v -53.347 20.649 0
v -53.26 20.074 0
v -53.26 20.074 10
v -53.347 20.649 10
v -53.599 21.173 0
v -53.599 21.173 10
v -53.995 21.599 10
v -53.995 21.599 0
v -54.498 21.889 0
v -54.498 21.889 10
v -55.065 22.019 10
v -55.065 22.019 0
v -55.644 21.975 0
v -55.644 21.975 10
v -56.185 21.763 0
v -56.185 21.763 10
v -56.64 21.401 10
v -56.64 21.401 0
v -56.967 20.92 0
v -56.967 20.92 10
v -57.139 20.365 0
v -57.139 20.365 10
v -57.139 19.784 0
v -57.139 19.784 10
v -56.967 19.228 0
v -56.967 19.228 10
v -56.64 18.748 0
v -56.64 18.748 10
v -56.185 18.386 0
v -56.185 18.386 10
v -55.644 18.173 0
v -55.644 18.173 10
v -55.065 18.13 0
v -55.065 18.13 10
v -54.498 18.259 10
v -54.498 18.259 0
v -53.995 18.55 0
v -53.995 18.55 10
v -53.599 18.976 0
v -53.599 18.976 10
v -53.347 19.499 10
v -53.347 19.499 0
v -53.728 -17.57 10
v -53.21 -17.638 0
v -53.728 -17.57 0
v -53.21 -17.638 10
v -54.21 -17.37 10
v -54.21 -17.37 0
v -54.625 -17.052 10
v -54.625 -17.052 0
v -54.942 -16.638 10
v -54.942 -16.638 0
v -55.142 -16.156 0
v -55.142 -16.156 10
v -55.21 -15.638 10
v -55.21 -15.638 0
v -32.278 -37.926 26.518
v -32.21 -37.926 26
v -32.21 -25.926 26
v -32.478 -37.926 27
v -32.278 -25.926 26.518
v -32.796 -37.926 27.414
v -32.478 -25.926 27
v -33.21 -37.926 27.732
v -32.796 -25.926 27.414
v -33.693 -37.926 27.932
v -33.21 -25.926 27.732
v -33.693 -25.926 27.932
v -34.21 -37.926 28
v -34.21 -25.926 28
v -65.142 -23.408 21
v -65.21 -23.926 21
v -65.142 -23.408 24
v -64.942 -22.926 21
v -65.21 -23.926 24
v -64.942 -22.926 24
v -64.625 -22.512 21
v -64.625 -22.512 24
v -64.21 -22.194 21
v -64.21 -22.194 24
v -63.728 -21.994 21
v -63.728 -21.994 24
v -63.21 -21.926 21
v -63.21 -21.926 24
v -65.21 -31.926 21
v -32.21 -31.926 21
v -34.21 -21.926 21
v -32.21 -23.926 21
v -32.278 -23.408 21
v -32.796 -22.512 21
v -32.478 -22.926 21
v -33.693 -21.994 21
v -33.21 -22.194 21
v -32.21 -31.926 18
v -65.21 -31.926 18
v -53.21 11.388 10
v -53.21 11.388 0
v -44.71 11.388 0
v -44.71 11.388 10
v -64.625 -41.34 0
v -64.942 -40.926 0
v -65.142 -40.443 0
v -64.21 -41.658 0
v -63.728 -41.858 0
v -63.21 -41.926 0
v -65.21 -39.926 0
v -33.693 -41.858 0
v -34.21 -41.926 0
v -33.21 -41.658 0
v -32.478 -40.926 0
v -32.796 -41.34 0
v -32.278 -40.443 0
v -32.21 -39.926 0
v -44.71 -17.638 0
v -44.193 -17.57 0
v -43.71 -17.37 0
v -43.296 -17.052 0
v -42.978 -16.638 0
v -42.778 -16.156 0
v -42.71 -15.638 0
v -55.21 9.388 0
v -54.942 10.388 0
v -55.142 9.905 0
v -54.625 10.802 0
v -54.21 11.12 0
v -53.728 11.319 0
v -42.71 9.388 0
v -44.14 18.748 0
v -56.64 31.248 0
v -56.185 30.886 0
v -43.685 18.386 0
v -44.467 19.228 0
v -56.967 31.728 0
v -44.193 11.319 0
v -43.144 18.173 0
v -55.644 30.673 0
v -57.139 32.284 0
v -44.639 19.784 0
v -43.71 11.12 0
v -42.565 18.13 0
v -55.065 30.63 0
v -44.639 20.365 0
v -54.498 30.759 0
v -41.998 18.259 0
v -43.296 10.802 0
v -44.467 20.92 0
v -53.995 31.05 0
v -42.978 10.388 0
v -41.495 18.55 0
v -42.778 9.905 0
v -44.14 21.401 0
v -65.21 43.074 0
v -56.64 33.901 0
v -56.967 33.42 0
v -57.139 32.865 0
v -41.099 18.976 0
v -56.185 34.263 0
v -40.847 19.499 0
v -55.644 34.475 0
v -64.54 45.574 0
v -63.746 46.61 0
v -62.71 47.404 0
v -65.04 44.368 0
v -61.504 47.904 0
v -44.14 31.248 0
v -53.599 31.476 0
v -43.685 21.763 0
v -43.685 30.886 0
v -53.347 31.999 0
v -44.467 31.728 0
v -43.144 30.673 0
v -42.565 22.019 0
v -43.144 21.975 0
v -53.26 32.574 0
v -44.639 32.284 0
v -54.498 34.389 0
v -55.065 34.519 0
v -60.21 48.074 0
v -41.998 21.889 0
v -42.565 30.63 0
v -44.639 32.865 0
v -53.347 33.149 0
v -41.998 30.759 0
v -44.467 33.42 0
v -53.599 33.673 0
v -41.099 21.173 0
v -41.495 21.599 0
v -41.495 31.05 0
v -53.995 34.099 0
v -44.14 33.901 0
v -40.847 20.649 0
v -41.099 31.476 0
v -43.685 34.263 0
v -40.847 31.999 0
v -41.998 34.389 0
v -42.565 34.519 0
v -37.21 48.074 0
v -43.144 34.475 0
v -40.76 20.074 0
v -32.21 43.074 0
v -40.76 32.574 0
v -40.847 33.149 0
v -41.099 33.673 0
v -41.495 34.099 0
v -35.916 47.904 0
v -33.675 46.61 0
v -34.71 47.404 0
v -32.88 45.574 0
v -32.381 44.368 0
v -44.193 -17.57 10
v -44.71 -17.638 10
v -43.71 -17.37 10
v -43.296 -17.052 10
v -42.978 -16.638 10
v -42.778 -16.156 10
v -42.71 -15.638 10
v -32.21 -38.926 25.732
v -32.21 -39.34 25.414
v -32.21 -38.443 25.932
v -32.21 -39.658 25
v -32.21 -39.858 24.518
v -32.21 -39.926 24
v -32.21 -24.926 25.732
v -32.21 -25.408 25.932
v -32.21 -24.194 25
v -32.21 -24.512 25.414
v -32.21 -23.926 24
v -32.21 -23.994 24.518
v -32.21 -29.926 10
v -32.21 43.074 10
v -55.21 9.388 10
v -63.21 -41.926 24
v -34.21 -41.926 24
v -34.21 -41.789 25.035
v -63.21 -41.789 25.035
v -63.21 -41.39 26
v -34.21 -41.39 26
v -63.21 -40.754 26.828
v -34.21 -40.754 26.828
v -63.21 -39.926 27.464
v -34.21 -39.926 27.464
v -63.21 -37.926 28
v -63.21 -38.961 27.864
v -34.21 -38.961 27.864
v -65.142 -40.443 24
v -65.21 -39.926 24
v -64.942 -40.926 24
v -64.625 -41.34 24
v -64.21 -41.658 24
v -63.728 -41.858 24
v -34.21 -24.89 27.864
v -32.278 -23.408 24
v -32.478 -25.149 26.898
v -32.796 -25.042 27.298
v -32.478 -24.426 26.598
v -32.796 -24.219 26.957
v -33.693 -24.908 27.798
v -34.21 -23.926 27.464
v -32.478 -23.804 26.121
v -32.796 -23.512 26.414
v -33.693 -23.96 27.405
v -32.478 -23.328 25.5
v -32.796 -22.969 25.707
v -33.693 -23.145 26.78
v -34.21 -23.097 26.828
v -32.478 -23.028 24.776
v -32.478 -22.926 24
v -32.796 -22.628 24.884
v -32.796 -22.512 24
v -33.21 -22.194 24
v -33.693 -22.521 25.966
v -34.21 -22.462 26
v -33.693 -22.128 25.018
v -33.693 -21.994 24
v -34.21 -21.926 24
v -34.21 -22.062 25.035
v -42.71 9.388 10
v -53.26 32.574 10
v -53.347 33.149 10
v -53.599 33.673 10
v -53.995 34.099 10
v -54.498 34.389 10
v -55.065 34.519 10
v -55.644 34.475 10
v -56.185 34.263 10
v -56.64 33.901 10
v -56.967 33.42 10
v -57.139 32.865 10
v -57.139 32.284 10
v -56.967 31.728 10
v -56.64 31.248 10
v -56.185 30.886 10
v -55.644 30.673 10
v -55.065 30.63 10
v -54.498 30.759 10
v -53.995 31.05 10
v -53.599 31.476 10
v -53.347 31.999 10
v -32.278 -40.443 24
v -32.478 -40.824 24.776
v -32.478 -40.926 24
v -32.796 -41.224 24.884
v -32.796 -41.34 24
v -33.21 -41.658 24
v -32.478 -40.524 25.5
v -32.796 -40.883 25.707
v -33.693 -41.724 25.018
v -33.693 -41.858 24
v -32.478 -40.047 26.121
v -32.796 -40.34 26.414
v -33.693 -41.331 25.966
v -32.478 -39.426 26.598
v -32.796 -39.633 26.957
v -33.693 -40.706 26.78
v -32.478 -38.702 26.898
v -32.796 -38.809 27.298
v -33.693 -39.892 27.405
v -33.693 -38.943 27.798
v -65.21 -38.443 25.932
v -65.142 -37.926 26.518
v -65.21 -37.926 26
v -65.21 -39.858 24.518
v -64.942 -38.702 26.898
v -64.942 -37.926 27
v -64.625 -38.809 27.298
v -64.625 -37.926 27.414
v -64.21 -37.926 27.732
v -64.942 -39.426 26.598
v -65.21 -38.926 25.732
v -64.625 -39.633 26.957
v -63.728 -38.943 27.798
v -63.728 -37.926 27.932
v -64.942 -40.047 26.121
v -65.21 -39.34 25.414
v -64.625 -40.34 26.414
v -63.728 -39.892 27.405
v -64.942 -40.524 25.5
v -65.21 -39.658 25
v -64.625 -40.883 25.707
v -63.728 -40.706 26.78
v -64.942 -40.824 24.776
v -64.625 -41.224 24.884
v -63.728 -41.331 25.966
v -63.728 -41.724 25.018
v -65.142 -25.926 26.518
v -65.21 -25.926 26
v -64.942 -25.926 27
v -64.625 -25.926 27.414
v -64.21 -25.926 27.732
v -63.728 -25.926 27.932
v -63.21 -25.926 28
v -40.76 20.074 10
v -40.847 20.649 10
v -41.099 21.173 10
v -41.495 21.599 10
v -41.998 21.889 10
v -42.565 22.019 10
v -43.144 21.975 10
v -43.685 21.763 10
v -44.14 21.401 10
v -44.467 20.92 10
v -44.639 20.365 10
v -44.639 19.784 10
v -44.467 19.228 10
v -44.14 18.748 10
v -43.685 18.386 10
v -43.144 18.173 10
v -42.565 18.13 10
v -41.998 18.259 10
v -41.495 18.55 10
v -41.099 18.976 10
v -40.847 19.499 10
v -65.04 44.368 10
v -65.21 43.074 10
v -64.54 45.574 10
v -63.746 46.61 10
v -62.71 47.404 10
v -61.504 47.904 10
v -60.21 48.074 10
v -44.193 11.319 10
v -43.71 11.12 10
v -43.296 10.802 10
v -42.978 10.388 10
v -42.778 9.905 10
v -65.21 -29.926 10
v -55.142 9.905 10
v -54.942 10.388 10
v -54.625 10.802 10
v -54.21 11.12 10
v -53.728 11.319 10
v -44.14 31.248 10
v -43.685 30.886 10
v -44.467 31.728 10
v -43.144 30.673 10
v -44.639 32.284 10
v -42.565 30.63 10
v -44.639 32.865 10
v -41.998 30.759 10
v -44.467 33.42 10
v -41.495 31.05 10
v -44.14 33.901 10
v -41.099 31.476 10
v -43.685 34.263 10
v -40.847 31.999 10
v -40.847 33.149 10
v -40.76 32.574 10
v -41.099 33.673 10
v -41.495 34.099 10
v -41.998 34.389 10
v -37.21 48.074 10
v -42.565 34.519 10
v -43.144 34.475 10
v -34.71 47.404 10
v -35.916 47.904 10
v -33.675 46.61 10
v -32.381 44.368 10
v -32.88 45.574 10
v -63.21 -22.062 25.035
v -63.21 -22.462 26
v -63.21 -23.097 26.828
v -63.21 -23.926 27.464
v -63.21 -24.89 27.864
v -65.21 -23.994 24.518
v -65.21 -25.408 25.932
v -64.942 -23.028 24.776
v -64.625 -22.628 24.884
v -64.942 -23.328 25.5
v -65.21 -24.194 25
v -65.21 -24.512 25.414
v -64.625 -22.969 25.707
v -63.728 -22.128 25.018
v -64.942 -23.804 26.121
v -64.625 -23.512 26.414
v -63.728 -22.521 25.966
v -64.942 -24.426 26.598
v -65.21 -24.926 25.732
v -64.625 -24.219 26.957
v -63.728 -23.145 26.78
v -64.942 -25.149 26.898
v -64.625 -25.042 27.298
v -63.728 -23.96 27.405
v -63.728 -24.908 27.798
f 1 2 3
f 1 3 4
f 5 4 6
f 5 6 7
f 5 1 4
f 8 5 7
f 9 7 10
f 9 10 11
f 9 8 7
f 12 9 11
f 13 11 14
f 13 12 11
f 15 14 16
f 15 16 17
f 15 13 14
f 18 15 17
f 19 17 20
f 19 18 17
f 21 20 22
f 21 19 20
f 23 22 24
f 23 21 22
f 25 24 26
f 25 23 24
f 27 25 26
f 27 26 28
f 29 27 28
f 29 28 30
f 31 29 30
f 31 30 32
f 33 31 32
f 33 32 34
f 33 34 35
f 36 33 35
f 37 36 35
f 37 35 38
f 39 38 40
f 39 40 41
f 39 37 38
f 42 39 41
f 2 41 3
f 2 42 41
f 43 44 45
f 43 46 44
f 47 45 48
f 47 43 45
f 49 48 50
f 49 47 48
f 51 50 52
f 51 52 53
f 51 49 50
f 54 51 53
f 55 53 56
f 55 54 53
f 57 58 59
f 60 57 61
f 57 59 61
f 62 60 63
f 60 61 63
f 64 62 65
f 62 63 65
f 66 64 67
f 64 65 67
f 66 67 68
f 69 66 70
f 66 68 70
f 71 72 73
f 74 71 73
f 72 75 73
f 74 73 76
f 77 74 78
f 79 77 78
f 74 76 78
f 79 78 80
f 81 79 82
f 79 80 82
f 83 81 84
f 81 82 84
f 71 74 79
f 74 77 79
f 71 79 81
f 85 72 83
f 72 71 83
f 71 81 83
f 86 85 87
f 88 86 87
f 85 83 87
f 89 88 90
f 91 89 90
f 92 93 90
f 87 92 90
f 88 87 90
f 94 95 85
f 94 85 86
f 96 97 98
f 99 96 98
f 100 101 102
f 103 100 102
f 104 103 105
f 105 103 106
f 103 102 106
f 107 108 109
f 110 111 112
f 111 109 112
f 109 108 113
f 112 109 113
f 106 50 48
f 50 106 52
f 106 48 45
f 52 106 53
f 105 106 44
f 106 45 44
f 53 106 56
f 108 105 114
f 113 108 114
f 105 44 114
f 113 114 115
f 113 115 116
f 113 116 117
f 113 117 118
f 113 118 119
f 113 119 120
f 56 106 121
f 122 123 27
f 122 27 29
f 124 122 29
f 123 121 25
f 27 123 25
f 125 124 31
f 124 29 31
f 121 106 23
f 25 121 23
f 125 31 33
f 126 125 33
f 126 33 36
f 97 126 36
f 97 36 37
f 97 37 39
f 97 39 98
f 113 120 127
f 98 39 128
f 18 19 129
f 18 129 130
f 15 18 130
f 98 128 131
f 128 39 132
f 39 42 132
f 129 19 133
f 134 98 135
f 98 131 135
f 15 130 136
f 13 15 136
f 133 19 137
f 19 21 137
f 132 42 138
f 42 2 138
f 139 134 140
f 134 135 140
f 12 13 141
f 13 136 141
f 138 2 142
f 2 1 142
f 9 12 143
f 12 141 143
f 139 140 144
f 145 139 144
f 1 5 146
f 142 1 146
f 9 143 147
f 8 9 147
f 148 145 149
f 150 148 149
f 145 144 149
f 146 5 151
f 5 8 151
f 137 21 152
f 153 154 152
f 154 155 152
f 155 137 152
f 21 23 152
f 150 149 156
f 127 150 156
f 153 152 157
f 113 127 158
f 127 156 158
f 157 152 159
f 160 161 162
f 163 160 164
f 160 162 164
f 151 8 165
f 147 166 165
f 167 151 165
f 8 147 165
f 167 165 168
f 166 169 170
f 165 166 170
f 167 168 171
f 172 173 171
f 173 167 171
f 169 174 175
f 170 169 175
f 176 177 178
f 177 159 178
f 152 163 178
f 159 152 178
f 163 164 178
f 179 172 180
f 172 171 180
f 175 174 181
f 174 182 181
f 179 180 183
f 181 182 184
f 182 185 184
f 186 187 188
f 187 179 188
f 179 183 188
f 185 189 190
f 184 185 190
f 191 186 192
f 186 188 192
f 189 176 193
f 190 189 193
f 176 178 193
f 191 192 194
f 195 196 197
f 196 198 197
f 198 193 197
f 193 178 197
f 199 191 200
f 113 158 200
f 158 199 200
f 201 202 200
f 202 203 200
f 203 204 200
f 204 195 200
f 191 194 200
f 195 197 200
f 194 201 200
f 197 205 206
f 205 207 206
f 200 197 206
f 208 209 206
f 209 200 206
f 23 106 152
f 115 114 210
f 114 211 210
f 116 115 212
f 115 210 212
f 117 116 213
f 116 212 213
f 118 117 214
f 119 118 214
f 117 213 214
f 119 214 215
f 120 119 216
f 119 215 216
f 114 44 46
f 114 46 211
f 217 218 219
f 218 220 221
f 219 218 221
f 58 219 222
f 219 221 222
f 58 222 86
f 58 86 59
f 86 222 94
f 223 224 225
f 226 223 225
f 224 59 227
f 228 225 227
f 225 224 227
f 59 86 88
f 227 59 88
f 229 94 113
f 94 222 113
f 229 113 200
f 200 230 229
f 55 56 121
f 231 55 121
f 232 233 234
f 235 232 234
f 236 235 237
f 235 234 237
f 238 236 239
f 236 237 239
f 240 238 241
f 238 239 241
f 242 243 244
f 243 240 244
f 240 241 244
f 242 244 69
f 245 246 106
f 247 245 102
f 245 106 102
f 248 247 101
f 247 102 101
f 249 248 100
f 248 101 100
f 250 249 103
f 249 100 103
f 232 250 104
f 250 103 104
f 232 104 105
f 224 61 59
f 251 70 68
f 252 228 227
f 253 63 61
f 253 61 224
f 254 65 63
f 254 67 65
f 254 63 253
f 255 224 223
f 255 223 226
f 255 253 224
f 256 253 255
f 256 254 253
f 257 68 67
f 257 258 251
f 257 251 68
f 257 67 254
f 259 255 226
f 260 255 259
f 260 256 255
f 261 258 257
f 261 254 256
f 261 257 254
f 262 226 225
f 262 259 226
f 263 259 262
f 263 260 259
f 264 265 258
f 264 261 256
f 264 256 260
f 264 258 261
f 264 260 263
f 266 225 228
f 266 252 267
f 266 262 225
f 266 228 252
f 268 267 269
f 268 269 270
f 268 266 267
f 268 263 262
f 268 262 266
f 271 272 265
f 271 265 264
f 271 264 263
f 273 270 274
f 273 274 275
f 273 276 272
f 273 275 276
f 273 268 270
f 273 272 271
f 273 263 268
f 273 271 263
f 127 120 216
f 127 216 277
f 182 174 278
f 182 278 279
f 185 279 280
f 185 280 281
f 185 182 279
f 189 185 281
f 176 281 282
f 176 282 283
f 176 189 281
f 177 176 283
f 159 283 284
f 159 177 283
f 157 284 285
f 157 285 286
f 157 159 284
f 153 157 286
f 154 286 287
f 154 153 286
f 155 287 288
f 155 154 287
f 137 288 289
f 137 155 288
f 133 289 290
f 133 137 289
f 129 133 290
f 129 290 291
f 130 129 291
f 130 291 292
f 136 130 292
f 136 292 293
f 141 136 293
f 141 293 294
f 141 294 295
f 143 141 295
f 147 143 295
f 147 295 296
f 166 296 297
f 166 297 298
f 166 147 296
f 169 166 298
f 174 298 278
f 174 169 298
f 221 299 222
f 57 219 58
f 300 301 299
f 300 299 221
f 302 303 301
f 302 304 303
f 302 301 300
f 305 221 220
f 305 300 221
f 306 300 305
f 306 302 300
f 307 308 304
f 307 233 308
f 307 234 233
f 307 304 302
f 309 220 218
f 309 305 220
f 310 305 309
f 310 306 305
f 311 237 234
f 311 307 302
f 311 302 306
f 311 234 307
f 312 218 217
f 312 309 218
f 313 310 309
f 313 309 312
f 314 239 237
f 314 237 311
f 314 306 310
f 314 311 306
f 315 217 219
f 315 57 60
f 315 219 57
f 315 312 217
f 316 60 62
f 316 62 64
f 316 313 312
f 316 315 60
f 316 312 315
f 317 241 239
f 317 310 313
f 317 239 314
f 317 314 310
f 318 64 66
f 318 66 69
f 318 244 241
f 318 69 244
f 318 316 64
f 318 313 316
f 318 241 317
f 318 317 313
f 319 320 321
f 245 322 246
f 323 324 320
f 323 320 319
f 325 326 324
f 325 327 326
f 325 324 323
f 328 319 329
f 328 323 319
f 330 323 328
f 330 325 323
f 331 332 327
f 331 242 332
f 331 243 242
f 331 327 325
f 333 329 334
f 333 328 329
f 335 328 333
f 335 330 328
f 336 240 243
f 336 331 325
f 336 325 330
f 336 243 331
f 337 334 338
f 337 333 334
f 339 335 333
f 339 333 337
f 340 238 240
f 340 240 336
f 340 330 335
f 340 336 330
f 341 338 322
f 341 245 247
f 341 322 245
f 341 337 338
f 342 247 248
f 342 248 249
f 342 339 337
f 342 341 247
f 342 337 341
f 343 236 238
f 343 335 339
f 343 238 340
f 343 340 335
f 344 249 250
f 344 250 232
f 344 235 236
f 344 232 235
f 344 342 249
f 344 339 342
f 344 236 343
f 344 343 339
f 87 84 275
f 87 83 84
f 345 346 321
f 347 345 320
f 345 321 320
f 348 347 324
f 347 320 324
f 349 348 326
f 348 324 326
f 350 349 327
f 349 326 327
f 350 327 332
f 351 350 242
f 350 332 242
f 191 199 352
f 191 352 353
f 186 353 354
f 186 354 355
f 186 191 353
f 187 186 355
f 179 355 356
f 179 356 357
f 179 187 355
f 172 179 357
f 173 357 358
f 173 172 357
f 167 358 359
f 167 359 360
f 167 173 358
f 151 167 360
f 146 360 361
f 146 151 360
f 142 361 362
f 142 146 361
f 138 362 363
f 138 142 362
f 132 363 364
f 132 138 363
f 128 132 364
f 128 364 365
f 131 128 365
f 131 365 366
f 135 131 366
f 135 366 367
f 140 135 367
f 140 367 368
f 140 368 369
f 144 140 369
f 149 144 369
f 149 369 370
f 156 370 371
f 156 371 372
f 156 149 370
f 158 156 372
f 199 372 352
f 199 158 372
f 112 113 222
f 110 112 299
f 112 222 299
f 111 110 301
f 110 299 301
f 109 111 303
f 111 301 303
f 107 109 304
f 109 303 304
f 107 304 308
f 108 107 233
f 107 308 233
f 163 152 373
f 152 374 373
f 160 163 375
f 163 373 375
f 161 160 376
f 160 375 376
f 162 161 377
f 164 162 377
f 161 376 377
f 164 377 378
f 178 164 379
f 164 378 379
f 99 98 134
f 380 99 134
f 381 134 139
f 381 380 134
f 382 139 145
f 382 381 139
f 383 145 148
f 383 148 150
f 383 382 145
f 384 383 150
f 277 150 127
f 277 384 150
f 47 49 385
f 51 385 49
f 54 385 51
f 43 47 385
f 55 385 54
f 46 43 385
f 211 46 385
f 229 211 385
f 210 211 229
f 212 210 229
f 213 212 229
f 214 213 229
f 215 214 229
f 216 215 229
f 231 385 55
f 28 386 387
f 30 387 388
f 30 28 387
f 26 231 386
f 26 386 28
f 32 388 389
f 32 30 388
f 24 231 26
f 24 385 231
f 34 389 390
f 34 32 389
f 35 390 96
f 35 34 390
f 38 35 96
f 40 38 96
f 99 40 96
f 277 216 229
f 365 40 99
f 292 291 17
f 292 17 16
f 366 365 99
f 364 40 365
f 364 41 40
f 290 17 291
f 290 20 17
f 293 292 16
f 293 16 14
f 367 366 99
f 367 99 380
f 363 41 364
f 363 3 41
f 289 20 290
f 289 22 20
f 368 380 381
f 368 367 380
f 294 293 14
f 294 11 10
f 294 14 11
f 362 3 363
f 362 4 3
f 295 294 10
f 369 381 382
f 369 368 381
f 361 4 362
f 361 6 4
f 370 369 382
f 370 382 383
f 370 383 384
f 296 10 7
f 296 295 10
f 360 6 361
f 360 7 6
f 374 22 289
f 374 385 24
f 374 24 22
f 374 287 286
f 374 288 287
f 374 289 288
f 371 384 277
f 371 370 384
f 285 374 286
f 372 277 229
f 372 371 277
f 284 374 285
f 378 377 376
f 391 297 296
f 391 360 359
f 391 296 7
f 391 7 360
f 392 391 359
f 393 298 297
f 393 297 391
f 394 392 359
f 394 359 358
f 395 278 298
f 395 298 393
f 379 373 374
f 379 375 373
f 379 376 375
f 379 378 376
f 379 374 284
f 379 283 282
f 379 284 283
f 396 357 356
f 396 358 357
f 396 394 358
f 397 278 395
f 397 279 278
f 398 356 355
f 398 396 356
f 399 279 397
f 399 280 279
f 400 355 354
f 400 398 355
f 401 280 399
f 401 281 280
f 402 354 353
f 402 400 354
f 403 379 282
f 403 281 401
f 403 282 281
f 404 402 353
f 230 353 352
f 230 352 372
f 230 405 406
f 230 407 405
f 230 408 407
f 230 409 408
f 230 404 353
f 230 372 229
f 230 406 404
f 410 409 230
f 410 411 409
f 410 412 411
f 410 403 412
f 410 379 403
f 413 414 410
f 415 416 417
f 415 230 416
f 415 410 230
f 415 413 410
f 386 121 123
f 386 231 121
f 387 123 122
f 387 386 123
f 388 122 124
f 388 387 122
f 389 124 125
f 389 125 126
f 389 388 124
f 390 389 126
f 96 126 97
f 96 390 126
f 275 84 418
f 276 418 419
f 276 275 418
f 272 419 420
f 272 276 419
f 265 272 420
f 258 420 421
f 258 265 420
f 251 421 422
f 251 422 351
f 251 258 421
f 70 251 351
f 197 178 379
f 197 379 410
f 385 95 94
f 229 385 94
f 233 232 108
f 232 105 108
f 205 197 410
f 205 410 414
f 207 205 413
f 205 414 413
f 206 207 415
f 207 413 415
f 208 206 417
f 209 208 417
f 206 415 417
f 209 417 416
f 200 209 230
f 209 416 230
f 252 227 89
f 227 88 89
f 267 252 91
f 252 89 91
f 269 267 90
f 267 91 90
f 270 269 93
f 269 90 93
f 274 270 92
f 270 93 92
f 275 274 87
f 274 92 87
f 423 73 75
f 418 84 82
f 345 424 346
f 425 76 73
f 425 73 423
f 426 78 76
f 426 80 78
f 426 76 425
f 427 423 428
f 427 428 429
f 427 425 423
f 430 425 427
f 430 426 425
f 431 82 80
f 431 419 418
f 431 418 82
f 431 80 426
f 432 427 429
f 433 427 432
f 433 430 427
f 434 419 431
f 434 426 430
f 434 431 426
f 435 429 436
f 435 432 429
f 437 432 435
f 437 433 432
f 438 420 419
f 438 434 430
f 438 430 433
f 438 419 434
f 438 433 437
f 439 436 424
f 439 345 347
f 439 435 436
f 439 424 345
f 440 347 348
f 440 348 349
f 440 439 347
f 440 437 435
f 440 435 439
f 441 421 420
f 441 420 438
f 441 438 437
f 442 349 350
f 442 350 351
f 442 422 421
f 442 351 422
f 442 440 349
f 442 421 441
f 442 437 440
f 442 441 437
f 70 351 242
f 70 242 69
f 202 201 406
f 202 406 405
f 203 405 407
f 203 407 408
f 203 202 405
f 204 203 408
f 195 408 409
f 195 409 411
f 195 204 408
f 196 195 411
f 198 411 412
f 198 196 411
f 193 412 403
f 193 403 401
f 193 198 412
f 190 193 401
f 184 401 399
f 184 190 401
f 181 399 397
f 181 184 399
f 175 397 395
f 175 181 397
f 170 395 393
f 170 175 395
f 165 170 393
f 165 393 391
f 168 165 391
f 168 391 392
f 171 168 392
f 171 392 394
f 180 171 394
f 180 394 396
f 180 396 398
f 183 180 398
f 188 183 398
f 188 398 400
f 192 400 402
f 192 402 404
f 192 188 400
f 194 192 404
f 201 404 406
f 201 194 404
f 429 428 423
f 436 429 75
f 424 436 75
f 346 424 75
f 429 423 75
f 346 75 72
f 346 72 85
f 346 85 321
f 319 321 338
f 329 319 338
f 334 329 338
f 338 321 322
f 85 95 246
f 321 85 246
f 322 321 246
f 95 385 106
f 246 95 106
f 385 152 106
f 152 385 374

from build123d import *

# Parameters (mm, degrees)
F0_W     = 33
F0_H     = 70
F0_W_2   = 12.5
F0_H_2   = 29.0257008746
F0_R     = 1.95
F0_H_3   = 10
F1_DEPTH = 10
F2_DEPTH = 28
F3_START = 10
F3_DEPTH = 11
F4_SIZE2 = 8
F4_SIZE  = 2
F5_R     = 4
F6_R     = 5
F7_R     = 2
F8_R     = 2


with BuildPart() as f1:
    # F0 (on Top) → F1 (new body)
    with BuildSketch(Plane.XY):
        with Locations((-48.7103275061, 13.0742679536)):
            Rectangle(F0_W, F0_H)
        with Locations((-48.9603275061, -3.1253187917)):
            Rectangle(F0_W_2, F0_H_2, mode=Mode.SUBTRACT)
        with Locations((-55.2103275061, 20.0742679536)):
            Circle(F0_R, mode=Mode.SUBTRACT)
        with Locations((-55.2103275061, 32.5742679536)):
            Circle(F0_R, mode=Mode.SUBTRACT)
        with Locations((-42.7103275061, 20.0742679536)):
            Circle(F0_R, mode=Mode.SUBTRACT)
        with Locations((-42.7103275061, 32.5742679536)):
            Circle(F0_R, mode=Mode.SUBTRACT)
        with Locations((-48.7103275061, -26.9257320464)):
            Rectangle(F0_W, F0_H_3)
        with Locations((-48.7103275061, -36.9257320464)):
            Rectangle(F0_W, F0_H_3)
    extrude(amount=F1_DEPTH)

    # F0 (on Top) → F2 (join)
    with BuildSketch(Plane.XY):
        with Locations((-48.7103275061, -26.9257320464)):
            Rectangle(F0_W, F0_H_3)
        with Locations((-48.7103275061, -36.9257320464)):
            Rectangle(F0_W, F0_H_3)
    extrude(amount=F2_DEPTH)

    # F0 (on Top) → F3 (cut)
    with BuildSketch(Plane.XY.offset(F3_START)):
        with Locations((-48.7103275061, -26.9257320464)):
            Rectangle(F0_W, F0_H_3)
    extrude(amount=F3_DEPTH, mode=Mode.SUBTRACT)

    # F4
    f4_edges = [f1.edges().sort_by_distance(p)[0] for p in [
        (-48.710328, -31.925732, 10),
    ]]
    f4_side = f1.faces().sort_by_distance((-33.075718, 8.074268, 10))[0]
    chamfer(f4_edges, length=F4_SIZE, length2=F4_SIZE2, reference=f4_side)

    # F5
    f5_edges = [f1.edges().sort_by_distance(p)[0] for p in [
        (-48.710328, -21.925732, 28),
        (-48.710328, -41.925732, 28),
    ]]
    fillet(f5_edges, radius=F5_R)

    # F6
    f6_edges = [f1.edges().sort_by_distance(p)[0] for p in [
        (-65.210328, 48.074268, 5),
        (-32.210328, 48.074268, 5),
    ]]
    fillet(f6_edges, radius=F6_R)

    # F7
    f7_edges = [f1.edges().sort_by_distance(p)[0] for p in [
        (-42.710328, 11.387532, 5),
        (-55.210328, 11.387532, 5),
        (-55.210328, -17.638169, 5),
        (-42.710328, -17.638169, 5),
    ]]
    fillet(f7_edges, radius=F7_R)

    # F8
    f8_edges = [f1.edges().sort_by_distance(p)[0] for p in [
        (-65.210328, -31.925732, 28),
        (-32.210328, -31.925732, 28),
    ]]
    fillet(f8_edges, radius=F8_R)


solid = f1.part
